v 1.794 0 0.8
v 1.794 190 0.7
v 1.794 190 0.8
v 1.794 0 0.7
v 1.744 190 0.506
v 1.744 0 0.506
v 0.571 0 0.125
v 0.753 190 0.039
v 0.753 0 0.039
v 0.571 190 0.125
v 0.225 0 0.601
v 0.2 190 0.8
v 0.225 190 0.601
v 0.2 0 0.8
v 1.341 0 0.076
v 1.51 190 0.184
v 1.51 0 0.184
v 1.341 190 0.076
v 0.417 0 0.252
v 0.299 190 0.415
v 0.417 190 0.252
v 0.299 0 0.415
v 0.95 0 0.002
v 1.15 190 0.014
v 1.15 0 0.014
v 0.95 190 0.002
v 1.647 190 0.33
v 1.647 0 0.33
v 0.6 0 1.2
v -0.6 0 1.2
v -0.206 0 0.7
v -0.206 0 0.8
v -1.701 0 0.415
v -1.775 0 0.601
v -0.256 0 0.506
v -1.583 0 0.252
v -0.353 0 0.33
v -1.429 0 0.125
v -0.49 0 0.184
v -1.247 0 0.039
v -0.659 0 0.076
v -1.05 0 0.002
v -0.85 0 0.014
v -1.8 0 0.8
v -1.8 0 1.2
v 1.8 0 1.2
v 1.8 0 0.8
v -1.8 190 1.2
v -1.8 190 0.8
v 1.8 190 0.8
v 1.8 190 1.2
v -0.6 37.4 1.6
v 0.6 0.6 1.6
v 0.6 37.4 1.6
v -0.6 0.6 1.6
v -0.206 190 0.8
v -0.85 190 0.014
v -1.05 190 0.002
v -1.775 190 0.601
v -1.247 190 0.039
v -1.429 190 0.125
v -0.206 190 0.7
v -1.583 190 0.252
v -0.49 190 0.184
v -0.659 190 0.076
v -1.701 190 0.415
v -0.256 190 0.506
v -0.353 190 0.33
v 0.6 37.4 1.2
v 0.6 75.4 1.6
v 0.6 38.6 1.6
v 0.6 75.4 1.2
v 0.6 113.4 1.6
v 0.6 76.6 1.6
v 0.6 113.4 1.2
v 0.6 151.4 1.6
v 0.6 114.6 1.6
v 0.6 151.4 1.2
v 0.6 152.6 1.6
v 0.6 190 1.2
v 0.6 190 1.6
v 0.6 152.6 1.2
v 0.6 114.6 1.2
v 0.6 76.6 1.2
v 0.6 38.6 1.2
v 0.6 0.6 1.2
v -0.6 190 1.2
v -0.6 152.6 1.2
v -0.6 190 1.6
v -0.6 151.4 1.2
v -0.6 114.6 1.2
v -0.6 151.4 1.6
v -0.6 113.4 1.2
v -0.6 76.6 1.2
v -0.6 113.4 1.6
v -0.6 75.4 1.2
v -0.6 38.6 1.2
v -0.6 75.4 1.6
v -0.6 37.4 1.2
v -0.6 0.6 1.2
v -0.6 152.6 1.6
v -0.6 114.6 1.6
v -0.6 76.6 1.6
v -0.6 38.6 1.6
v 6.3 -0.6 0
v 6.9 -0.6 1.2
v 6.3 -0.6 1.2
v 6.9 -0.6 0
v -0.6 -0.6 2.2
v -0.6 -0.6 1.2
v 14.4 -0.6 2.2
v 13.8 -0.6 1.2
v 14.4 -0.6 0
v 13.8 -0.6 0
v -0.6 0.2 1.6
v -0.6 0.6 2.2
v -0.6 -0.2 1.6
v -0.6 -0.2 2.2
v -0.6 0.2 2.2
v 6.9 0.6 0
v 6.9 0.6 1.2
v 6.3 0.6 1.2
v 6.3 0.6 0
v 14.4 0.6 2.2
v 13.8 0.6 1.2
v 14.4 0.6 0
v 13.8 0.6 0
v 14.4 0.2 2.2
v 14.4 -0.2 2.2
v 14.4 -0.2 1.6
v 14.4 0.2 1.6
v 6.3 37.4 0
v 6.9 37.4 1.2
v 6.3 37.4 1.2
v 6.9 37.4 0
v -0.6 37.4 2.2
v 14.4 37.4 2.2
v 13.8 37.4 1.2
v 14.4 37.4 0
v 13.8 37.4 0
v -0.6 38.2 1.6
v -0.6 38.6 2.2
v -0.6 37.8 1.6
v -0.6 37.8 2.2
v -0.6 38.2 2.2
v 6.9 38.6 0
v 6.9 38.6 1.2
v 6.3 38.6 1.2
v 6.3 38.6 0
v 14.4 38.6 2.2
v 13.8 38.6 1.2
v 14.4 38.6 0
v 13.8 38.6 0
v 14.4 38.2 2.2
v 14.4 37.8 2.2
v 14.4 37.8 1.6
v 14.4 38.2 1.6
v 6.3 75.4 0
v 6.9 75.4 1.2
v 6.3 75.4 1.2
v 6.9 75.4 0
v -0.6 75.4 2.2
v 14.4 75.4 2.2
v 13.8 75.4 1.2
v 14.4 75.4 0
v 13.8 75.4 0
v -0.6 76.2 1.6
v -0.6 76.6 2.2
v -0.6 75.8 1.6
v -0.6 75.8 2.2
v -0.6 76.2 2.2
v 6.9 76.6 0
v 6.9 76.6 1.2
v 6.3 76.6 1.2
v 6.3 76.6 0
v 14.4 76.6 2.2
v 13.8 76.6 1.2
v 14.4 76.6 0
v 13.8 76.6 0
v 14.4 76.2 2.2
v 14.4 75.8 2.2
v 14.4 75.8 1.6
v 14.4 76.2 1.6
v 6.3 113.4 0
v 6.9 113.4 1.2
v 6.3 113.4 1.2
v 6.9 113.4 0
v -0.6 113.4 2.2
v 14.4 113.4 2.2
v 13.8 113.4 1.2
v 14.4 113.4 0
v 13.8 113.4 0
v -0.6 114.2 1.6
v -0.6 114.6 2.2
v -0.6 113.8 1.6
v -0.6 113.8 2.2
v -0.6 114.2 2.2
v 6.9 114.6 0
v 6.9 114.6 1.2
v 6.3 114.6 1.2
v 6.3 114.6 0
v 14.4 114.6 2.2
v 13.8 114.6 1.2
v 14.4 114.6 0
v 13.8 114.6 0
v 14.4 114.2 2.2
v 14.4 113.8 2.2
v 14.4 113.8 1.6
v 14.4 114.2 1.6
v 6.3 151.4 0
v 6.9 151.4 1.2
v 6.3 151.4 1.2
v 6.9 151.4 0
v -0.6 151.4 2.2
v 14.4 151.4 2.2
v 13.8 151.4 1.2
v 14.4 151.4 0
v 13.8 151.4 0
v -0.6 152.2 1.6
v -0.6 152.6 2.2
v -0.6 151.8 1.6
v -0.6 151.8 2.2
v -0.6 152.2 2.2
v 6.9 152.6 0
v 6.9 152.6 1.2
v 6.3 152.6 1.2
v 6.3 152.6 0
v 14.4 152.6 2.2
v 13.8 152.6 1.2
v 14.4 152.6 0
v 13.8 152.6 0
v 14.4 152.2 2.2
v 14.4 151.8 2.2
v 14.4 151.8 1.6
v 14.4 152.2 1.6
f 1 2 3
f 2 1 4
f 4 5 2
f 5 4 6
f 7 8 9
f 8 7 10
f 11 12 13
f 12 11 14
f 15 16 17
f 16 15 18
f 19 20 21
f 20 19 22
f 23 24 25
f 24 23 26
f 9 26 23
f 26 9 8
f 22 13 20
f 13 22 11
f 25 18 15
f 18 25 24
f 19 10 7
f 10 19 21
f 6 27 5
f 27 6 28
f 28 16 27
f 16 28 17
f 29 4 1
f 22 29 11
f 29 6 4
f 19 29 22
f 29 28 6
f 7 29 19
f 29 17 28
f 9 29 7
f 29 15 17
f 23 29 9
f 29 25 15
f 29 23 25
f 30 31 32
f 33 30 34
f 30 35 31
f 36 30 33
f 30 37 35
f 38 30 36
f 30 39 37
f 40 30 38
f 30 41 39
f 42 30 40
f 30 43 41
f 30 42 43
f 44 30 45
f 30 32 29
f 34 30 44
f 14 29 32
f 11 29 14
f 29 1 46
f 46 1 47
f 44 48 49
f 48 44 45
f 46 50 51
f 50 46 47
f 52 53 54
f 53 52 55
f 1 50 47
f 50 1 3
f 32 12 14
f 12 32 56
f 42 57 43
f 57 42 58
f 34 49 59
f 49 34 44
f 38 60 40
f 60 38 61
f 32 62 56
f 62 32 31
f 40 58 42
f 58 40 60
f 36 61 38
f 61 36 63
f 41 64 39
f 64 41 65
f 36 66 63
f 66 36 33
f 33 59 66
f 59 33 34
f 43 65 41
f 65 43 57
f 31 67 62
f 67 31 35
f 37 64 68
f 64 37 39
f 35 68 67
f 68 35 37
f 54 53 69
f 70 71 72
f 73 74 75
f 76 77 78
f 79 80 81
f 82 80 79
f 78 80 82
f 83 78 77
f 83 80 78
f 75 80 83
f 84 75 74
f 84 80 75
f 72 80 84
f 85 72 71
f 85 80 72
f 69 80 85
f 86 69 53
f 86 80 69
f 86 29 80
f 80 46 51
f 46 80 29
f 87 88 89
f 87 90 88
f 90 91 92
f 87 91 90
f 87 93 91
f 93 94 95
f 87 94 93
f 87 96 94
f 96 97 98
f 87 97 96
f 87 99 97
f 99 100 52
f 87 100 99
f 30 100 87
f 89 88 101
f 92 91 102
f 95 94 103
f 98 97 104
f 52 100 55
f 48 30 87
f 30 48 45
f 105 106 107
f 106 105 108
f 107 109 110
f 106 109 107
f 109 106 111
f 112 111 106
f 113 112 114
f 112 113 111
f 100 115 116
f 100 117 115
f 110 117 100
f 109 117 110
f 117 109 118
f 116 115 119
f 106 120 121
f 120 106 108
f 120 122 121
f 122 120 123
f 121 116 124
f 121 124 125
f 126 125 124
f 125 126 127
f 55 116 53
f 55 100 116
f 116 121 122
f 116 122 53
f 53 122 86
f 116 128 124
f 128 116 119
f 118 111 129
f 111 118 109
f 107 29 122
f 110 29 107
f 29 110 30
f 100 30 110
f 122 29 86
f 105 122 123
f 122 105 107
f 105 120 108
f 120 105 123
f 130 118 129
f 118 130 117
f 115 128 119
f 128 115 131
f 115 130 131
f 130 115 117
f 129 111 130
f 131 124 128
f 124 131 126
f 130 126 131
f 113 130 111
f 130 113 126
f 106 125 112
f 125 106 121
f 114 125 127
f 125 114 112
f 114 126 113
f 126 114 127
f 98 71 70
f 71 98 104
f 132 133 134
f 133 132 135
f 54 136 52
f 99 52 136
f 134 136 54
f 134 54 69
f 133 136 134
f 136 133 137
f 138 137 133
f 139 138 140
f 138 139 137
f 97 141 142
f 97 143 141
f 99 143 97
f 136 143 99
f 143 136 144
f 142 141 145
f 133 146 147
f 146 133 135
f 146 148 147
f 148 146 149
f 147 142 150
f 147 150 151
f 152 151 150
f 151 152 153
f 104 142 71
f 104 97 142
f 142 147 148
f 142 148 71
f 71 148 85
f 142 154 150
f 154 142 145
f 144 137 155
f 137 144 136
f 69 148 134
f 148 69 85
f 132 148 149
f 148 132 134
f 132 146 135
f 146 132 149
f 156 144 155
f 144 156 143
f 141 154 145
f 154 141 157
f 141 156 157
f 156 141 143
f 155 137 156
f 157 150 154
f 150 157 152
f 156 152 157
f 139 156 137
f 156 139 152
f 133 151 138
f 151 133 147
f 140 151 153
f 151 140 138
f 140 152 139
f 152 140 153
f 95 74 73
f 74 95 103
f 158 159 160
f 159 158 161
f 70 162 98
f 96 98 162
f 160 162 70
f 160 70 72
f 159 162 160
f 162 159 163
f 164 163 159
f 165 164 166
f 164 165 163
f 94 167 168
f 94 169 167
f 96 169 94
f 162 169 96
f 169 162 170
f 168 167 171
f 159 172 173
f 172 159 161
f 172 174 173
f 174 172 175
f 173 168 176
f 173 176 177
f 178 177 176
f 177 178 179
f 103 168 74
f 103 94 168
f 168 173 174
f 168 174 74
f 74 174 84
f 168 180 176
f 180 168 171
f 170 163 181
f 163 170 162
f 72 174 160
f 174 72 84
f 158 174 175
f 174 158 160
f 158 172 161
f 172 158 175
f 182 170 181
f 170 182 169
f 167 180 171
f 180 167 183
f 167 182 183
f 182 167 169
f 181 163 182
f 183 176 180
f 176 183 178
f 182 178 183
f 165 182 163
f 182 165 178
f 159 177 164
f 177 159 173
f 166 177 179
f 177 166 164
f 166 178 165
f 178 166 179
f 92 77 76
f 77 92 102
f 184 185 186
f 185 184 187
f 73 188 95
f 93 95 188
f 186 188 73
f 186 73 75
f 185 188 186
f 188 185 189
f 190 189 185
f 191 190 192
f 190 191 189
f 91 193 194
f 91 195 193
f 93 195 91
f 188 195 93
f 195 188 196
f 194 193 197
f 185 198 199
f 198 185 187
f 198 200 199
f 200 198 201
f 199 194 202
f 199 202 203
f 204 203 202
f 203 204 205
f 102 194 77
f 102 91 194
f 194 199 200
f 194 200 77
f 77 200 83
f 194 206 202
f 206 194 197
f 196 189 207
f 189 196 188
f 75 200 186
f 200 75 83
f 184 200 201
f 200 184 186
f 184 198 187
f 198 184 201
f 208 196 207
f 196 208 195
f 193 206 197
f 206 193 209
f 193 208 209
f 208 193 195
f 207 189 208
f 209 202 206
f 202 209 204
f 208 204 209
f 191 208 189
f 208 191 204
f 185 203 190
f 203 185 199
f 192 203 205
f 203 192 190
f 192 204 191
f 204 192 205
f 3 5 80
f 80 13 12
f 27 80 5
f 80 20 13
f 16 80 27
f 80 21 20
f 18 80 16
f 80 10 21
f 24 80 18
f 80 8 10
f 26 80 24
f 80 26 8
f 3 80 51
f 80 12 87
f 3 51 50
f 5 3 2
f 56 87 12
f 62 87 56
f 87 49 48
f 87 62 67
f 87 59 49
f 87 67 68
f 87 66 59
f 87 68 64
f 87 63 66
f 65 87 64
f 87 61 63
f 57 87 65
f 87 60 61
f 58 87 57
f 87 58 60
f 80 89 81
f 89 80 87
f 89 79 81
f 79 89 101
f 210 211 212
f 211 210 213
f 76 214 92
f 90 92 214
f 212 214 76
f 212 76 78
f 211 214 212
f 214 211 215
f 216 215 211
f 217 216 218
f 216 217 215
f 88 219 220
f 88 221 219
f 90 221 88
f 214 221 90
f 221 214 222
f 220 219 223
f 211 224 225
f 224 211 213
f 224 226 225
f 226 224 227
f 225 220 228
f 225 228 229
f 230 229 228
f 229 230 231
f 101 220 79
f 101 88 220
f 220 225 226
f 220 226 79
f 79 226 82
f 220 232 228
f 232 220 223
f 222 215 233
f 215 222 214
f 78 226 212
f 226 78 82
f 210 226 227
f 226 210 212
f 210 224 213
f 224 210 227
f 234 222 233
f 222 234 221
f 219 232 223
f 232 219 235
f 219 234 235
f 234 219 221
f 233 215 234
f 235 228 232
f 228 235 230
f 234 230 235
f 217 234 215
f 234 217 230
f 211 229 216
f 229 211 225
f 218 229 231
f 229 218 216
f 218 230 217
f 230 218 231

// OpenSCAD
$fn=25;

segment_length = 38;
segment_count = 5;

module pole_foot() {
    translate([-6.9,0.4,0]) rotate([-90,90,-90]) {
    difference() {
        union() {
            translate([-0.6,0,0])  cube([1.2,1,7.5]);
            translate([-0.6,-1.2,0])  cube([1.2,1.2,0.6]);
        }
        translate([-0.2,0.4,0]) cube([0.4,0.6,7.5]);
    }
    }
}

module pole( height = 7.5 ) {
    translate([-height+0.6,0.4,0]) rotate([-90,90,-90]) {
    difference() {
        translate([-0.6,0,0])  cube([1.2,1,height]);
        translate([-0.2,0.4,0]) cube([0.4,0.6,height]);    
    }}
}


module segment( length = 22 ) {
    translate([0,0,0.8]) rotate([90,0,180]) {
        difference() {
        union() {
            translate([-1,0,0]) cylinder(length,0.8,0.8);
            translate([-1.8,0,0]) cube([3.6,0.8,length]);
            translate([1,0,0]) cylinder(length,0.8,0.8);
        }
        translate([-1.8,0.4,0]) cube([1.2,0.4,length]);
        translate([0.6,0.4,0]) cube([1.2,0.4,length]);        
    }
      
    pole_foot();
    translate([-7.5,0,0]) pole_foot();
    }
}

for (i = [0:segment_count-1]) {
    translate([0,i*segment_length,0]) segment(segment_length);
}
